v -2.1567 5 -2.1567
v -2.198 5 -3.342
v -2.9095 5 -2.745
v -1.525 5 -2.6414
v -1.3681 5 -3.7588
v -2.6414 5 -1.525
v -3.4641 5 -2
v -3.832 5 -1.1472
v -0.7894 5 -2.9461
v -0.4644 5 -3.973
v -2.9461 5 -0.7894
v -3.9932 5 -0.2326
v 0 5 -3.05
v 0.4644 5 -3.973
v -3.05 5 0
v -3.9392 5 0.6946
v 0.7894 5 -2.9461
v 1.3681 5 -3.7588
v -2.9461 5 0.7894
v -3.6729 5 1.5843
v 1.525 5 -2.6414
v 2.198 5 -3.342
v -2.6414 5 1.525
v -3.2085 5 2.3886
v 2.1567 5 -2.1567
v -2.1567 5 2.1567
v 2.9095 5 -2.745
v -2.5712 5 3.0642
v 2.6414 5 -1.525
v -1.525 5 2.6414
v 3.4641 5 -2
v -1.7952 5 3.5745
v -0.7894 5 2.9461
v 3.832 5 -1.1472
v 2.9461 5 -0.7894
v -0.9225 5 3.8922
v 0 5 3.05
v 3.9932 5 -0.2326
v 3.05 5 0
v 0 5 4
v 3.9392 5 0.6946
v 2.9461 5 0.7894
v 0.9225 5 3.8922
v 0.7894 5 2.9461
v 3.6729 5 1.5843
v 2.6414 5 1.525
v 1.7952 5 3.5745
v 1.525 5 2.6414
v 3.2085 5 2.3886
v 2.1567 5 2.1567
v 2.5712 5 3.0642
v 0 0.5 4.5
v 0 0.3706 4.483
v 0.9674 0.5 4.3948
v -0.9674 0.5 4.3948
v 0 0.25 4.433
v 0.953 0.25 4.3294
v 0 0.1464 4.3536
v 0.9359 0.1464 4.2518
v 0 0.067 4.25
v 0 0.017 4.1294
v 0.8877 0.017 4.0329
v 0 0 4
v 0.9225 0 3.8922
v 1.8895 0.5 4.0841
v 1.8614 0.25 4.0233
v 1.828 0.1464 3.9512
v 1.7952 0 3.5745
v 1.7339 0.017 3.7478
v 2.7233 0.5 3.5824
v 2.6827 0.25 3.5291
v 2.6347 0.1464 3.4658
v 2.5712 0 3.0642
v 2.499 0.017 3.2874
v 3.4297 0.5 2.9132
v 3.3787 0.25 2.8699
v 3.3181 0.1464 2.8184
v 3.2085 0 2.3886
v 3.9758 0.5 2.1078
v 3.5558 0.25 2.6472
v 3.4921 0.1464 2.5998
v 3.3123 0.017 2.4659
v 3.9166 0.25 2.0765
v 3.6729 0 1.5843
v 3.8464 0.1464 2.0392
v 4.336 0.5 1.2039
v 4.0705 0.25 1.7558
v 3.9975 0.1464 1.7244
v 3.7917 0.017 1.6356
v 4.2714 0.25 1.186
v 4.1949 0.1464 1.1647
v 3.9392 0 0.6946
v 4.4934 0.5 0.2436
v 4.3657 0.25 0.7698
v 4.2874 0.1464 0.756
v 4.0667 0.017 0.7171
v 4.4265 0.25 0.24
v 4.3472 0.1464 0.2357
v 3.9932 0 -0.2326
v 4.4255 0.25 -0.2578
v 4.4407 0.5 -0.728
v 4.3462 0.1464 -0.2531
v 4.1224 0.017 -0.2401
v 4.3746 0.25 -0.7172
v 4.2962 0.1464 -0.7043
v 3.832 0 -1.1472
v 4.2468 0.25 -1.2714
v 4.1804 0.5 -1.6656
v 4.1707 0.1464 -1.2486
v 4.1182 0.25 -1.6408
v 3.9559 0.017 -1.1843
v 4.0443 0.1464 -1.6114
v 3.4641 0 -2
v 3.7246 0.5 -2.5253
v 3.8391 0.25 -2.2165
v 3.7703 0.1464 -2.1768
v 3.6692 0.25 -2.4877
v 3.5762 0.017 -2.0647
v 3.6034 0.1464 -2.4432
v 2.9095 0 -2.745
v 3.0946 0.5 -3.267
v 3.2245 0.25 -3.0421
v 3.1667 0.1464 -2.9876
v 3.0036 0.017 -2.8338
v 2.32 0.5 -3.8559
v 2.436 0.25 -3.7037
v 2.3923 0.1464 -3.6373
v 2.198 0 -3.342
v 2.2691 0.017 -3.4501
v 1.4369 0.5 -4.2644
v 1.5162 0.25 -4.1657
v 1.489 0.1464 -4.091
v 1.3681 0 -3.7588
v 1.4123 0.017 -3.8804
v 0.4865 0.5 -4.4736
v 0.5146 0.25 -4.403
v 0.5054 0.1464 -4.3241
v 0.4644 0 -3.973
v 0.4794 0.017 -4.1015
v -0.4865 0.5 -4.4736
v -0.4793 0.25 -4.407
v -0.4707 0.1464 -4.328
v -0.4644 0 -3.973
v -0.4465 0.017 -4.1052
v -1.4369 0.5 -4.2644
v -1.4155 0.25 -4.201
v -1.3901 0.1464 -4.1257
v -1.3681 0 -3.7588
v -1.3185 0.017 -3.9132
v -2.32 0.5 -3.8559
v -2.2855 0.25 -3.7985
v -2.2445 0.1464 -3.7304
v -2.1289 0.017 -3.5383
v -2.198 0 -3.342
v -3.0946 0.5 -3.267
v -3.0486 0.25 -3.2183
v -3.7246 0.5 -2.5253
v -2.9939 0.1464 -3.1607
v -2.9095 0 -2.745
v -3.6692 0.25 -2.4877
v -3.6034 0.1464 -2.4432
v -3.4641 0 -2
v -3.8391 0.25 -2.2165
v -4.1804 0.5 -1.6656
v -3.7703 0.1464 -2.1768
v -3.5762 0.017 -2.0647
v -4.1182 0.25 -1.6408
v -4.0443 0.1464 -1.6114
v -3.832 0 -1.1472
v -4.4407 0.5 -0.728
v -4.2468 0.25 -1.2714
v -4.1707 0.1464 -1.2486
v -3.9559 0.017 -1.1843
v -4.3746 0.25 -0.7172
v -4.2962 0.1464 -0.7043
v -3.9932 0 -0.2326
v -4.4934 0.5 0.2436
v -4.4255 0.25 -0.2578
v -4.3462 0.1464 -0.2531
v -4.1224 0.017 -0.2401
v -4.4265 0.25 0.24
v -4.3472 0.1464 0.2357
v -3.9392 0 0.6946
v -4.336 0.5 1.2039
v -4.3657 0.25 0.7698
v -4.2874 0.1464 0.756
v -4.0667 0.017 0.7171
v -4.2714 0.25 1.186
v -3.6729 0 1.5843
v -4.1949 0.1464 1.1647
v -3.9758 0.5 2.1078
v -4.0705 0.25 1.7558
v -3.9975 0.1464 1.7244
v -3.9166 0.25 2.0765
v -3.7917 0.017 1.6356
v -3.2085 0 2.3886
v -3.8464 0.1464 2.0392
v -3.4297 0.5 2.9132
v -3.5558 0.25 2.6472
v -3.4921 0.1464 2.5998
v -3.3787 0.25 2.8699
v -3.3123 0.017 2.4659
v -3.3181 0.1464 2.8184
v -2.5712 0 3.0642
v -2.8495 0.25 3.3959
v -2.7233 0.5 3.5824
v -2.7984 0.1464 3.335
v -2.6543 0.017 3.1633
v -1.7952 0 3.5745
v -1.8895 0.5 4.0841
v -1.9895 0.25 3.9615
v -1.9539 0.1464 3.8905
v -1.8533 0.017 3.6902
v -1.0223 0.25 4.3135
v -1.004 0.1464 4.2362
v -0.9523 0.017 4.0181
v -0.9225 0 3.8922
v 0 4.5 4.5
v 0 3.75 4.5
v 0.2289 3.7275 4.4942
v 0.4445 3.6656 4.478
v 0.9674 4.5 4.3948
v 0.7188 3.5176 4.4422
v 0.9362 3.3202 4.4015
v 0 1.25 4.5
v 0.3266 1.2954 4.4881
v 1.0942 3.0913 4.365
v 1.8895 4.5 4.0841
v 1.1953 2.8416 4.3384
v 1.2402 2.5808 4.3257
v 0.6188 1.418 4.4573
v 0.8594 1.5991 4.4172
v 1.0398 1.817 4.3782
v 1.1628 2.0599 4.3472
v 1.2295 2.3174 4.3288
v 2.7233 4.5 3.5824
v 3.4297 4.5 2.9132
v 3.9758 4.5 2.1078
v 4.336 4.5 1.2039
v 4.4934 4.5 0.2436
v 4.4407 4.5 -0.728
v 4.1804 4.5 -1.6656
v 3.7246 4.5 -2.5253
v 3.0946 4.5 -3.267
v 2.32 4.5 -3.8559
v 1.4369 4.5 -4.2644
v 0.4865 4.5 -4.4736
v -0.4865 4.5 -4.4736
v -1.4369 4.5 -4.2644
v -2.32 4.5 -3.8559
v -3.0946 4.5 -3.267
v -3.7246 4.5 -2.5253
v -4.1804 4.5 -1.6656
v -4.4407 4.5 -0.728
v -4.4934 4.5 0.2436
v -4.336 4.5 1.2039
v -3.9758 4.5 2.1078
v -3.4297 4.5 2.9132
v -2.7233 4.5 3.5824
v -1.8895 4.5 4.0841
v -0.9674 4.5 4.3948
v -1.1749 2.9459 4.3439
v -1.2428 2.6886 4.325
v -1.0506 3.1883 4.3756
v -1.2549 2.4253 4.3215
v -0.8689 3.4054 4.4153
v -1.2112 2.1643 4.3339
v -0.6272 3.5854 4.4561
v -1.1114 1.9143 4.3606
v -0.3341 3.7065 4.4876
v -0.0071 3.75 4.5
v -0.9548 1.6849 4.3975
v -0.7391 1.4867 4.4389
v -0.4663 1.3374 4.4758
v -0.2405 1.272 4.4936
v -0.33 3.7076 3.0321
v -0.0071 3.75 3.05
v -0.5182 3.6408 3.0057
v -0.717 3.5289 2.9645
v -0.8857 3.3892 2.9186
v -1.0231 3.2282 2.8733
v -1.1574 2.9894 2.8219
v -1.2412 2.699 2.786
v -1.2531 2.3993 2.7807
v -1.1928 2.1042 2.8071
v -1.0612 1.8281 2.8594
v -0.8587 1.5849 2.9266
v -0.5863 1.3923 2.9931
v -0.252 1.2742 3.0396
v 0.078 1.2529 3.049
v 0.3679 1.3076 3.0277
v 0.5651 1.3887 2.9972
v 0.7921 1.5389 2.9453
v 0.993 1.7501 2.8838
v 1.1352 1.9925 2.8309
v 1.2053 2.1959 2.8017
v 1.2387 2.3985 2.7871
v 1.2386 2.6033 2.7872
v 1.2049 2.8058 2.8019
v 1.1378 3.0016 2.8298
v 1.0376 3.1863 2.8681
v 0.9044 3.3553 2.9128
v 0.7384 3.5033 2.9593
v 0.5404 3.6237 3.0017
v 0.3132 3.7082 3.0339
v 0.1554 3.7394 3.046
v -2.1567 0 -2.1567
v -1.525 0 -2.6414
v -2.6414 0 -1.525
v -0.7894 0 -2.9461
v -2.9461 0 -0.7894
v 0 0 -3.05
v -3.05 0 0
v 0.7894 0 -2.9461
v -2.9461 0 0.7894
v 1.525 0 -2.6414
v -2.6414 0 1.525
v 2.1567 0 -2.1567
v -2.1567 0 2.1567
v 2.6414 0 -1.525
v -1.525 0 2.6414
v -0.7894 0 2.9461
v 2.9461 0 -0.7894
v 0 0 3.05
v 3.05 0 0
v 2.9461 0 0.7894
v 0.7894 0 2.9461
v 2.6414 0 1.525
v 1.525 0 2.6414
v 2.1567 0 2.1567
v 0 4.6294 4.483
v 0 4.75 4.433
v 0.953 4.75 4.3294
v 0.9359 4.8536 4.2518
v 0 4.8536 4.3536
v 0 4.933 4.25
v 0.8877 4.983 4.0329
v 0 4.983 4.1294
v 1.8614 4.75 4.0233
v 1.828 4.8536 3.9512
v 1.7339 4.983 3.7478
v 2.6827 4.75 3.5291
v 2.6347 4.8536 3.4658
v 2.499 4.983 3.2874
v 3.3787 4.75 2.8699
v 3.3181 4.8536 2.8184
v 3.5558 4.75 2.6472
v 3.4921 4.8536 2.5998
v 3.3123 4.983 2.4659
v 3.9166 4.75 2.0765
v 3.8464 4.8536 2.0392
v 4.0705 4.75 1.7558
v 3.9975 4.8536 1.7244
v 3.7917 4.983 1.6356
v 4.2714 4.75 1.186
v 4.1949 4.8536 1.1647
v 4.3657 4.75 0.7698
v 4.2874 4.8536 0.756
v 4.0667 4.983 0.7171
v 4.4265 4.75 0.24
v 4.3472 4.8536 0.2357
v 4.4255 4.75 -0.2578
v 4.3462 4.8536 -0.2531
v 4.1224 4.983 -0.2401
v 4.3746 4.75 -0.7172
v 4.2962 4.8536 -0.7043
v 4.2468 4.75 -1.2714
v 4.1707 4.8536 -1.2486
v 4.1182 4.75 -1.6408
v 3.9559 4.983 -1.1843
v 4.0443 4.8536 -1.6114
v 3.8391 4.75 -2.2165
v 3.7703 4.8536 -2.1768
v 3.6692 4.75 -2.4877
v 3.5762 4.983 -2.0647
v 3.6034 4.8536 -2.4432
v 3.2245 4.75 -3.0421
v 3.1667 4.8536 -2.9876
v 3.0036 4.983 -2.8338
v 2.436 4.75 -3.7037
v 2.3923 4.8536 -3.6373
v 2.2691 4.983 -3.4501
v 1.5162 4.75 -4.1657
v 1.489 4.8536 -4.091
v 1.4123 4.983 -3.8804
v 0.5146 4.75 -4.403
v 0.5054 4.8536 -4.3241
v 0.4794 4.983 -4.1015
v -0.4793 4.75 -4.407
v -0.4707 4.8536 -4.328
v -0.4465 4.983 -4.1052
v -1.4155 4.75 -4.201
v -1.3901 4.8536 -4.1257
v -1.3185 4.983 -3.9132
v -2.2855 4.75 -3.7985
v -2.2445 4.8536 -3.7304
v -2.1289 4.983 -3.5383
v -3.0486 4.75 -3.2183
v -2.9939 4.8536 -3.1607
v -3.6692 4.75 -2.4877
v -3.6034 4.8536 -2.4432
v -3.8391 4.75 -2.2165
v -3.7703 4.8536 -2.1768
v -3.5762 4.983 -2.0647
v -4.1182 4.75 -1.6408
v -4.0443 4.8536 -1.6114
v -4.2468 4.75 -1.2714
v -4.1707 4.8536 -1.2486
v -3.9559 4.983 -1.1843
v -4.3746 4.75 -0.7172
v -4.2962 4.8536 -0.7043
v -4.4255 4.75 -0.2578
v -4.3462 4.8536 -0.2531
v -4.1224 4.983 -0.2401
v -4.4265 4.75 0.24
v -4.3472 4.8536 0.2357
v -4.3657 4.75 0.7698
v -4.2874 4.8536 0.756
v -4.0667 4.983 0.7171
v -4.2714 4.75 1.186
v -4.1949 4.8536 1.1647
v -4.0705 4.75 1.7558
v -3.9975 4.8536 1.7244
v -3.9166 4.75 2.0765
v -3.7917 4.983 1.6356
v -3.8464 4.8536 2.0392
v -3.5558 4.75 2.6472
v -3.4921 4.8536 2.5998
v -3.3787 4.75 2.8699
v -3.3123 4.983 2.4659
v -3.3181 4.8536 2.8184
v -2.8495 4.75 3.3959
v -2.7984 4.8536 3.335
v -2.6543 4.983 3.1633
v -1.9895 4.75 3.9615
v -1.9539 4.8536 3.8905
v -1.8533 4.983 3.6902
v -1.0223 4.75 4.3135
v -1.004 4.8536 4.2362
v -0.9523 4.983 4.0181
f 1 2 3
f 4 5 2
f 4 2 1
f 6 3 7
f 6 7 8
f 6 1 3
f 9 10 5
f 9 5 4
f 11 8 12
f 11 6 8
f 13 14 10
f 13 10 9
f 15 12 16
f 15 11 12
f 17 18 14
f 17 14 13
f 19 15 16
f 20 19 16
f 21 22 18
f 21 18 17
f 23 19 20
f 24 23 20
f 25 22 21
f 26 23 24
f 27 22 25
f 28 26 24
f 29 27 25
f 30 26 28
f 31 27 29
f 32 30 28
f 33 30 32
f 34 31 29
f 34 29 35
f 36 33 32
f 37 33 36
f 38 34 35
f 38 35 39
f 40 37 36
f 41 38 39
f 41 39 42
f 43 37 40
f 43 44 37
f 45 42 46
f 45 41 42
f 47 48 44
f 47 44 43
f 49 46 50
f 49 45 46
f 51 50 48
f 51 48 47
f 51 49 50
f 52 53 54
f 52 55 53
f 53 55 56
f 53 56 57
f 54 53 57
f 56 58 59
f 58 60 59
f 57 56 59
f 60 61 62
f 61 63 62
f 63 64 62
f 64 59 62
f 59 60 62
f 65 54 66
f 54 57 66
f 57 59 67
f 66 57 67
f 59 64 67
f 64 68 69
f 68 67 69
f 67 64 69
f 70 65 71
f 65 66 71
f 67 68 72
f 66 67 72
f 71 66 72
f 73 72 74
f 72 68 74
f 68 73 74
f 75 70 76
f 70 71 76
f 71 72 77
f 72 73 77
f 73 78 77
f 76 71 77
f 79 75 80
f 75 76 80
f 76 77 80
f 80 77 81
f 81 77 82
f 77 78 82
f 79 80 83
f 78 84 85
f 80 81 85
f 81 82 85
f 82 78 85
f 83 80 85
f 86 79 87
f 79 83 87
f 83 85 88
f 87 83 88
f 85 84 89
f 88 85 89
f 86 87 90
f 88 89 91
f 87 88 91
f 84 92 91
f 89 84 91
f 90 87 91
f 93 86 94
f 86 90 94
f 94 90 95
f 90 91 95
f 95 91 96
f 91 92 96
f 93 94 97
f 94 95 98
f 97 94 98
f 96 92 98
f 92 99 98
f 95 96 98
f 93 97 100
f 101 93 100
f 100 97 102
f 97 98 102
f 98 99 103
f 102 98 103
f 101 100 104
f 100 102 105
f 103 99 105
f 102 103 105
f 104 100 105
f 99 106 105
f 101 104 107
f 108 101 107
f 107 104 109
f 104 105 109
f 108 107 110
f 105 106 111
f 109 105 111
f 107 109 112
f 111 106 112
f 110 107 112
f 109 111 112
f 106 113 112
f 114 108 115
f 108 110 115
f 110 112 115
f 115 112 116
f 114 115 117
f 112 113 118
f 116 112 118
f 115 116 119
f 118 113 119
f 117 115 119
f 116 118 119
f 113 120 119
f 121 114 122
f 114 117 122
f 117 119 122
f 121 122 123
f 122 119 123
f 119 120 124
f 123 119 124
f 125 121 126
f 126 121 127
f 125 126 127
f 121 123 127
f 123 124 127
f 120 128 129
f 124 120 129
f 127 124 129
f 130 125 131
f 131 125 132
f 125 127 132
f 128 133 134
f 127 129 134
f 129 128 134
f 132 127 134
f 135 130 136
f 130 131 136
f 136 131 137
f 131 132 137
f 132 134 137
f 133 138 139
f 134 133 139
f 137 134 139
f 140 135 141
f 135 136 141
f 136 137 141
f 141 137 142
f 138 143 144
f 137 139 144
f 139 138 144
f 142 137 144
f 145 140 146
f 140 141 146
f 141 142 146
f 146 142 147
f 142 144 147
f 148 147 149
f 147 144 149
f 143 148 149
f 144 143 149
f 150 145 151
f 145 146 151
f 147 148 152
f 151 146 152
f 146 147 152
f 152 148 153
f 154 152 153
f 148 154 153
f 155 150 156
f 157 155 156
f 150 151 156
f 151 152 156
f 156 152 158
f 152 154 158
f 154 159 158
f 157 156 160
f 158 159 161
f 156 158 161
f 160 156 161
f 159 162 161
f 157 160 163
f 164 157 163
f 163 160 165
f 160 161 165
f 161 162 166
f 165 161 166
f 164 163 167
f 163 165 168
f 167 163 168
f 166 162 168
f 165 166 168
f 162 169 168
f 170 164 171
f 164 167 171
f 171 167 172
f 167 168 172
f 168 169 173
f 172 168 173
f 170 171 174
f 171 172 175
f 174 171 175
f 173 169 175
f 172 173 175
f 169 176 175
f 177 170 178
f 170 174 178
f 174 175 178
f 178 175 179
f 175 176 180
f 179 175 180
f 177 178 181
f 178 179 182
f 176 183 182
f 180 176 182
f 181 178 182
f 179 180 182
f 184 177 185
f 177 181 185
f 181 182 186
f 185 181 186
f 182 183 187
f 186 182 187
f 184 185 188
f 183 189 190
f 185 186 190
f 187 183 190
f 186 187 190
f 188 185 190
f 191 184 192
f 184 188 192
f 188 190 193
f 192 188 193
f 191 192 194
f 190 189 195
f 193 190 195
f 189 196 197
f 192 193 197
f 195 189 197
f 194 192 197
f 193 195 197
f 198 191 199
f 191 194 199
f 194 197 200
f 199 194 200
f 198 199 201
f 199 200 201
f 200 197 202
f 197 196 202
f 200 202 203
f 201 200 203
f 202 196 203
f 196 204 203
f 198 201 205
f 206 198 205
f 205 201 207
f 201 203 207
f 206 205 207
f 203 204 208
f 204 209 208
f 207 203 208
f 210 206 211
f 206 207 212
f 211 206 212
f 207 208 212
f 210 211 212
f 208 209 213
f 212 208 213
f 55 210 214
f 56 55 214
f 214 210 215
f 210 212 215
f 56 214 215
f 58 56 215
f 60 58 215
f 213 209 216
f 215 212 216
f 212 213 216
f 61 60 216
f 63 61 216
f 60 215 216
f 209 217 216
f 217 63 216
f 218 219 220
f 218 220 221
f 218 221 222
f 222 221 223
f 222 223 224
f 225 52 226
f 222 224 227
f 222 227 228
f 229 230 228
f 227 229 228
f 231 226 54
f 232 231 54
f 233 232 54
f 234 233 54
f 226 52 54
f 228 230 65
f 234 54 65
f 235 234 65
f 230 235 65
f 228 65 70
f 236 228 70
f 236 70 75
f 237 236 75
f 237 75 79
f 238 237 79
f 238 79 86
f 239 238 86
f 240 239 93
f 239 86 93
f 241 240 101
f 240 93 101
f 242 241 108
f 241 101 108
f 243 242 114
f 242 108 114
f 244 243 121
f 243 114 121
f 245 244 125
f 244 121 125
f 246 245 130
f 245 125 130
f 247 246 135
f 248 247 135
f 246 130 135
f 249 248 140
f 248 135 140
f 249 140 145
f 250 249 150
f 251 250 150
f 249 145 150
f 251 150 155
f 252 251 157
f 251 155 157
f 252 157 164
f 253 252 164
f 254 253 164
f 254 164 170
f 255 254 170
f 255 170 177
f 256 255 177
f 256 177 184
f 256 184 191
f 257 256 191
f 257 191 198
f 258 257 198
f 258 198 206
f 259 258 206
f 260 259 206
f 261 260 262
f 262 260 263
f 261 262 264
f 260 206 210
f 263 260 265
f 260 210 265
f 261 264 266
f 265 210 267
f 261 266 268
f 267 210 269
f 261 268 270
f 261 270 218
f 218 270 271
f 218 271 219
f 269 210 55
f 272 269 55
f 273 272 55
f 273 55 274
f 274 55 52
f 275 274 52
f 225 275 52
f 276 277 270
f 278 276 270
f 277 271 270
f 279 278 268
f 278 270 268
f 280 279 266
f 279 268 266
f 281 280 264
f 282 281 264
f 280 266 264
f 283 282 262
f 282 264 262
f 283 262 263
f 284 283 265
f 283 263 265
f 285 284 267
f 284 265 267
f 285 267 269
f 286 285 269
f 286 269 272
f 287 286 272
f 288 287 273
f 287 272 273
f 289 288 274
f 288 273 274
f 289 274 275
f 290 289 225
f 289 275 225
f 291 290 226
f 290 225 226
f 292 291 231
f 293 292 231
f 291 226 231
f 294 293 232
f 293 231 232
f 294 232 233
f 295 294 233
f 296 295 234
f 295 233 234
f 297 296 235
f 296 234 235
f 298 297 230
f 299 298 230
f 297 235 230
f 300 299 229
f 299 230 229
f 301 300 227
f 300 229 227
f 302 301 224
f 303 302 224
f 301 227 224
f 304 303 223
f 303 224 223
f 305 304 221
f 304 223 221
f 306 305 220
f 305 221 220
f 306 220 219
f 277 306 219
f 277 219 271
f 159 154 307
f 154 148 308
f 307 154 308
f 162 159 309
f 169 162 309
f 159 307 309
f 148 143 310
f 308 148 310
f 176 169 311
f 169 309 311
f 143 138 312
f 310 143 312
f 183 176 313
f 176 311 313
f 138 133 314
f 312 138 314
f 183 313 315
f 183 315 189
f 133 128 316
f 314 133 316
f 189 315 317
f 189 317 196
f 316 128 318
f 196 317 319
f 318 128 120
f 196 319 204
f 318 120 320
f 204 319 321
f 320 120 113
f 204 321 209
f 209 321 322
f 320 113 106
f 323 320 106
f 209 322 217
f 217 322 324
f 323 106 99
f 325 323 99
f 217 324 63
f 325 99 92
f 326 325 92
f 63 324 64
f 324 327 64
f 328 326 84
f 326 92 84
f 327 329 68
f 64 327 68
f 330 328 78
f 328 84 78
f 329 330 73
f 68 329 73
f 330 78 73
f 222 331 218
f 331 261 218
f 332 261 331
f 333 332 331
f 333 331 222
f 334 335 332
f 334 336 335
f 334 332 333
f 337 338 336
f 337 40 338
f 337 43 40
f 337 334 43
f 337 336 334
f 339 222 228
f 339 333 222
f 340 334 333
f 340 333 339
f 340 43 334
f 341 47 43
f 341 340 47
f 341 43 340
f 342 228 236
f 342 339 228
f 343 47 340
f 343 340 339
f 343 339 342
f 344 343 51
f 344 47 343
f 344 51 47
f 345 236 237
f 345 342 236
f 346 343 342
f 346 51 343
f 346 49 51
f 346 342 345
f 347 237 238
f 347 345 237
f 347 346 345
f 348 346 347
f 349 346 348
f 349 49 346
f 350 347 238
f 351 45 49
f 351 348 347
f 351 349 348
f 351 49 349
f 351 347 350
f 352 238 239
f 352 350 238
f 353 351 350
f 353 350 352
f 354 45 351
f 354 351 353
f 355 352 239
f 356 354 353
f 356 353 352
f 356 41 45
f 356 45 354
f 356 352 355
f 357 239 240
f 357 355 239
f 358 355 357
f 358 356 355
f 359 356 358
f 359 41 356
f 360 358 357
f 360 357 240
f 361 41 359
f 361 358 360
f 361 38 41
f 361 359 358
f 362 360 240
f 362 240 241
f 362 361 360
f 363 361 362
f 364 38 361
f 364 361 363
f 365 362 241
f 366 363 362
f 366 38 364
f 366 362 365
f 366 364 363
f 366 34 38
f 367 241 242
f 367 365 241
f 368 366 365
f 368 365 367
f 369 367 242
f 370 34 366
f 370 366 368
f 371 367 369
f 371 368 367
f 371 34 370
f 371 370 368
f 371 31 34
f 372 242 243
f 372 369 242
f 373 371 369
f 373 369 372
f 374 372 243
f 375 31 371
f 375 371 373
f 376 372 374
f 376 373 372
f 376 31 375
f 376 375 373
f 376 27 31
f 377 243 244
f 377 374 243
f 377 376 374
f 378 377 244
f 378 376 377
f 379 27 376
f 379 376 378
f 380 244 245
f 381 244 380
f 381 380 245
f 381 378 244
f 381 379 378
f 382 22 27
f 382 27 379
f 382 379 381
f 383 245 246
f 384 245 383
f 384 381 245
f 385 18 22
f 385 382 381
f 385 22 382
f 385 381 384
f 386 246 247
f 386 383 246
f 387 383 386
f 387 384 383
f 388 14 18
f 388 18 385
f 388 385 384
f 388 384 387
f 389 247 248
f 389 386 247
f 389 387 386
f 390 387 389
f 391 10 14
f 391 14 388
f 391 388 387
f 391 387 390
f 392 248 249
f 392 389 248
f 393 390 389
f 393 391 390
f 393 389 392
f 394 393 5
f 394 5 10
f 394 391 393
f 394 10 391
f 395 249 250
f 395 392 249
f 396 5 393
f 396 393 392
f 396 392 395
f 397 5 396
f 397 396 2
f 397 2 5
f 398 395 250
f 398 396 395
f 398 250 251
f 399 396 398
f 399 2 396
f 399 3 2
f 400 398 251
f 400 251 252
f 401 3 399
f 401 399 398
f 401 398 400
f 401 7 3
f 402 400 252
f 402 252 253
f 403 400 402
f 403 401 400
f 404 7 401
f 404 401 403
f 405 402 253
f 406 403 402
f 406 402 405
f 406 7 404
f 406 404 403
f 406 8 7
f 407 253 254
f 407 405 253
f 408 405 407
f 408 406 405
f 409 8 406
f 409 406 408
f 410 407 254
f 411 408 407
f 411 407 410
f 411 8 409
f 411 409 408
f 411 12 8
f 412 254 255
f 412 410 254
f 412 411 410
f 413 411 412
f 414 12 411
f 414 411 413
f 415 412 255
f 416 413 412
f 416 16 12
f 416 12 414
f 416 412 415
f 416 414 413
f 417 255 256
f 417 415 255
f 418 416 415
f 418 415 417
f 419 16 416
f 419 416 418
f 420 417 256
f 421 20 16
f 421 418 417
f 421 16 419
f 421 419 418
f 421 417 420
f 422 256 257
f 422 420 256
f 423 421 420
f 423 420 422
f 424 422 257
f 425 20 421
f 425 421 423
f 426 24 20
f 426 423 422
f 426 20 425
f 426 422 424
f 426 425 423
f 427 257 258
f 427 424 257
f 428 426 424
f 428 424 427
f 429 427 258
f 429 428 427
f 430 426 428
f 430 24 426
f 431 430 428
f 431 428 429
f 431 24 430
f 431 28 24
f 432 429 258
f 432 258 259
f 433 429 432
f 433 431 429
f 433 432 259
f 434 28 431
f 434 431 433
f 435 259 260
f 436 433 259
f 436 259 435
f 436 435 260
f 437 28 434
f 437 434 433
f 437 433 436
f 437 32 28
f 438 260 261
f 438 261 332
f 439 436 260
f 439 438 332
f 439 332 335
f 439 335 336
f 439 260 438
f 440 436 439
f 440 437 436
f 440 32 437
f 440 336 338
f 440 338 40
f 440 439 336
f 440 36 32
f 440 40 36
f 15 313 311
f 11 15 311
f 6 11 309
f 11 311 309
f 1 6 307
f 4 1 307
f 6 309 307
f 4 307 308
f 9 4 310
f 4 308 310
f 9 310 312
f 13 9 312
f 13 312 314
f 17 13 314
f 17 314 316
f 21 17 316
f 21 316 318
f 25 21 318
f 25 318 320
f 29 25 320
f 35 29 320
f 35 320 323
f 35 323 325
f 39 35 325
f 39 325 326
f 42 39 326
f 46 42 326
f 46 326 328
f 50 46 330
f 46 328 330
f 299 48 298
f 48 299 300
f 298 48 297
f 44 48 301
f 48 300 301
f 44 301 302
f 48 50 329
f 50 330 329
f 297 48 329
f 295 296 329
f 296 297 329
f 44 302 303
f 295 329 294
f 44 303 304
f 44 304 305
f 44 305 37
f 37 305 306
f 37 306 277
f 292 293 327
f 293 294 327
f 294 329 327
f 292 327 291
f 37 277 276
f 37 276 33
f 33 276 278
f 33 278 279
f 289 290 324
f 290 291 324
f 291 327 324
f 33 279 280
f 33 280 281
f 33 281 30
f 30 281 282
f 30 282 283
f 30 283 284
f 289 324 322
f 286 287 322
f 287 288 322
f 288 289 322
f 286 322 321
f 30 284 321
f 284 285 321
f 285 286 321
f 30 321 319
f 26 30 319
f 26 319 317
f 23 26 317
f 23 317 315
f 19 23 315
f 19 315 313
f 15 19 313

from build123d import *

# Parameters (mm, degrees)
SKETCH1_R                  = 4.5
BOSS_EXTRUDE1_DEPTH        = 5
F_6_1_6_1_DIAMETER_HOLE1_D = 6.1
SKETCH6_W                  = 1.25
SKETCH6_H                  = 4.5
FILLET1_R                  = 0.5


with BuildPart() as part:
    # Sketch1 → Boss-Extrude1 (new body)
    with BuildSketch(Plane(origin=(0, 0, 0), x_dir=(1, 0, 0), z_dir=(0, 1, 0))):
        with Locations(Location((0, 0, 0), (0, 0, 270))):
            Circle(SKETCH1_R)
    extrude(amount=BOSS_EXTRUDE1_DEPTH)

    # Ø6.1 (6.1) Diameter Hole1 (through all)
    with Locations(Plane(origin=(0, 5, 0), x_dir=(1, 0, 0), z_dir=(0, 1, 0))):
        with Locations((0, 0)):
            Hole(F_6_1_6_1_DIAMETER_HOLE1_D / 2)

    # Sketch6 → M3 Tapped Hole1 (revolve, cut)
    with BuildSketch(Plane(origin=(-0.007135696, 2.5, 0), x_dir=(0, 1, 0), z_dir=(1, 0, 0))):
        with Locations((0.625, 2.25)):
            Rectangle(SKETCH6_W, SKETCH6_H)
    revolve(axis=Axis((-0.007135696, 2.5, -6.35), (0, 0, 1)), mode=Mode.SUBTRACT)

    # Fillet1
    fillet1_edges = [part.edges().sort_by_distance(p)[0] for p in [
        (0, 0, -4.5),
        (0, 5, -4.5),
    ]]
    fillet(fillet1_edges, radius=FILLET1_R)


solid = part.part
